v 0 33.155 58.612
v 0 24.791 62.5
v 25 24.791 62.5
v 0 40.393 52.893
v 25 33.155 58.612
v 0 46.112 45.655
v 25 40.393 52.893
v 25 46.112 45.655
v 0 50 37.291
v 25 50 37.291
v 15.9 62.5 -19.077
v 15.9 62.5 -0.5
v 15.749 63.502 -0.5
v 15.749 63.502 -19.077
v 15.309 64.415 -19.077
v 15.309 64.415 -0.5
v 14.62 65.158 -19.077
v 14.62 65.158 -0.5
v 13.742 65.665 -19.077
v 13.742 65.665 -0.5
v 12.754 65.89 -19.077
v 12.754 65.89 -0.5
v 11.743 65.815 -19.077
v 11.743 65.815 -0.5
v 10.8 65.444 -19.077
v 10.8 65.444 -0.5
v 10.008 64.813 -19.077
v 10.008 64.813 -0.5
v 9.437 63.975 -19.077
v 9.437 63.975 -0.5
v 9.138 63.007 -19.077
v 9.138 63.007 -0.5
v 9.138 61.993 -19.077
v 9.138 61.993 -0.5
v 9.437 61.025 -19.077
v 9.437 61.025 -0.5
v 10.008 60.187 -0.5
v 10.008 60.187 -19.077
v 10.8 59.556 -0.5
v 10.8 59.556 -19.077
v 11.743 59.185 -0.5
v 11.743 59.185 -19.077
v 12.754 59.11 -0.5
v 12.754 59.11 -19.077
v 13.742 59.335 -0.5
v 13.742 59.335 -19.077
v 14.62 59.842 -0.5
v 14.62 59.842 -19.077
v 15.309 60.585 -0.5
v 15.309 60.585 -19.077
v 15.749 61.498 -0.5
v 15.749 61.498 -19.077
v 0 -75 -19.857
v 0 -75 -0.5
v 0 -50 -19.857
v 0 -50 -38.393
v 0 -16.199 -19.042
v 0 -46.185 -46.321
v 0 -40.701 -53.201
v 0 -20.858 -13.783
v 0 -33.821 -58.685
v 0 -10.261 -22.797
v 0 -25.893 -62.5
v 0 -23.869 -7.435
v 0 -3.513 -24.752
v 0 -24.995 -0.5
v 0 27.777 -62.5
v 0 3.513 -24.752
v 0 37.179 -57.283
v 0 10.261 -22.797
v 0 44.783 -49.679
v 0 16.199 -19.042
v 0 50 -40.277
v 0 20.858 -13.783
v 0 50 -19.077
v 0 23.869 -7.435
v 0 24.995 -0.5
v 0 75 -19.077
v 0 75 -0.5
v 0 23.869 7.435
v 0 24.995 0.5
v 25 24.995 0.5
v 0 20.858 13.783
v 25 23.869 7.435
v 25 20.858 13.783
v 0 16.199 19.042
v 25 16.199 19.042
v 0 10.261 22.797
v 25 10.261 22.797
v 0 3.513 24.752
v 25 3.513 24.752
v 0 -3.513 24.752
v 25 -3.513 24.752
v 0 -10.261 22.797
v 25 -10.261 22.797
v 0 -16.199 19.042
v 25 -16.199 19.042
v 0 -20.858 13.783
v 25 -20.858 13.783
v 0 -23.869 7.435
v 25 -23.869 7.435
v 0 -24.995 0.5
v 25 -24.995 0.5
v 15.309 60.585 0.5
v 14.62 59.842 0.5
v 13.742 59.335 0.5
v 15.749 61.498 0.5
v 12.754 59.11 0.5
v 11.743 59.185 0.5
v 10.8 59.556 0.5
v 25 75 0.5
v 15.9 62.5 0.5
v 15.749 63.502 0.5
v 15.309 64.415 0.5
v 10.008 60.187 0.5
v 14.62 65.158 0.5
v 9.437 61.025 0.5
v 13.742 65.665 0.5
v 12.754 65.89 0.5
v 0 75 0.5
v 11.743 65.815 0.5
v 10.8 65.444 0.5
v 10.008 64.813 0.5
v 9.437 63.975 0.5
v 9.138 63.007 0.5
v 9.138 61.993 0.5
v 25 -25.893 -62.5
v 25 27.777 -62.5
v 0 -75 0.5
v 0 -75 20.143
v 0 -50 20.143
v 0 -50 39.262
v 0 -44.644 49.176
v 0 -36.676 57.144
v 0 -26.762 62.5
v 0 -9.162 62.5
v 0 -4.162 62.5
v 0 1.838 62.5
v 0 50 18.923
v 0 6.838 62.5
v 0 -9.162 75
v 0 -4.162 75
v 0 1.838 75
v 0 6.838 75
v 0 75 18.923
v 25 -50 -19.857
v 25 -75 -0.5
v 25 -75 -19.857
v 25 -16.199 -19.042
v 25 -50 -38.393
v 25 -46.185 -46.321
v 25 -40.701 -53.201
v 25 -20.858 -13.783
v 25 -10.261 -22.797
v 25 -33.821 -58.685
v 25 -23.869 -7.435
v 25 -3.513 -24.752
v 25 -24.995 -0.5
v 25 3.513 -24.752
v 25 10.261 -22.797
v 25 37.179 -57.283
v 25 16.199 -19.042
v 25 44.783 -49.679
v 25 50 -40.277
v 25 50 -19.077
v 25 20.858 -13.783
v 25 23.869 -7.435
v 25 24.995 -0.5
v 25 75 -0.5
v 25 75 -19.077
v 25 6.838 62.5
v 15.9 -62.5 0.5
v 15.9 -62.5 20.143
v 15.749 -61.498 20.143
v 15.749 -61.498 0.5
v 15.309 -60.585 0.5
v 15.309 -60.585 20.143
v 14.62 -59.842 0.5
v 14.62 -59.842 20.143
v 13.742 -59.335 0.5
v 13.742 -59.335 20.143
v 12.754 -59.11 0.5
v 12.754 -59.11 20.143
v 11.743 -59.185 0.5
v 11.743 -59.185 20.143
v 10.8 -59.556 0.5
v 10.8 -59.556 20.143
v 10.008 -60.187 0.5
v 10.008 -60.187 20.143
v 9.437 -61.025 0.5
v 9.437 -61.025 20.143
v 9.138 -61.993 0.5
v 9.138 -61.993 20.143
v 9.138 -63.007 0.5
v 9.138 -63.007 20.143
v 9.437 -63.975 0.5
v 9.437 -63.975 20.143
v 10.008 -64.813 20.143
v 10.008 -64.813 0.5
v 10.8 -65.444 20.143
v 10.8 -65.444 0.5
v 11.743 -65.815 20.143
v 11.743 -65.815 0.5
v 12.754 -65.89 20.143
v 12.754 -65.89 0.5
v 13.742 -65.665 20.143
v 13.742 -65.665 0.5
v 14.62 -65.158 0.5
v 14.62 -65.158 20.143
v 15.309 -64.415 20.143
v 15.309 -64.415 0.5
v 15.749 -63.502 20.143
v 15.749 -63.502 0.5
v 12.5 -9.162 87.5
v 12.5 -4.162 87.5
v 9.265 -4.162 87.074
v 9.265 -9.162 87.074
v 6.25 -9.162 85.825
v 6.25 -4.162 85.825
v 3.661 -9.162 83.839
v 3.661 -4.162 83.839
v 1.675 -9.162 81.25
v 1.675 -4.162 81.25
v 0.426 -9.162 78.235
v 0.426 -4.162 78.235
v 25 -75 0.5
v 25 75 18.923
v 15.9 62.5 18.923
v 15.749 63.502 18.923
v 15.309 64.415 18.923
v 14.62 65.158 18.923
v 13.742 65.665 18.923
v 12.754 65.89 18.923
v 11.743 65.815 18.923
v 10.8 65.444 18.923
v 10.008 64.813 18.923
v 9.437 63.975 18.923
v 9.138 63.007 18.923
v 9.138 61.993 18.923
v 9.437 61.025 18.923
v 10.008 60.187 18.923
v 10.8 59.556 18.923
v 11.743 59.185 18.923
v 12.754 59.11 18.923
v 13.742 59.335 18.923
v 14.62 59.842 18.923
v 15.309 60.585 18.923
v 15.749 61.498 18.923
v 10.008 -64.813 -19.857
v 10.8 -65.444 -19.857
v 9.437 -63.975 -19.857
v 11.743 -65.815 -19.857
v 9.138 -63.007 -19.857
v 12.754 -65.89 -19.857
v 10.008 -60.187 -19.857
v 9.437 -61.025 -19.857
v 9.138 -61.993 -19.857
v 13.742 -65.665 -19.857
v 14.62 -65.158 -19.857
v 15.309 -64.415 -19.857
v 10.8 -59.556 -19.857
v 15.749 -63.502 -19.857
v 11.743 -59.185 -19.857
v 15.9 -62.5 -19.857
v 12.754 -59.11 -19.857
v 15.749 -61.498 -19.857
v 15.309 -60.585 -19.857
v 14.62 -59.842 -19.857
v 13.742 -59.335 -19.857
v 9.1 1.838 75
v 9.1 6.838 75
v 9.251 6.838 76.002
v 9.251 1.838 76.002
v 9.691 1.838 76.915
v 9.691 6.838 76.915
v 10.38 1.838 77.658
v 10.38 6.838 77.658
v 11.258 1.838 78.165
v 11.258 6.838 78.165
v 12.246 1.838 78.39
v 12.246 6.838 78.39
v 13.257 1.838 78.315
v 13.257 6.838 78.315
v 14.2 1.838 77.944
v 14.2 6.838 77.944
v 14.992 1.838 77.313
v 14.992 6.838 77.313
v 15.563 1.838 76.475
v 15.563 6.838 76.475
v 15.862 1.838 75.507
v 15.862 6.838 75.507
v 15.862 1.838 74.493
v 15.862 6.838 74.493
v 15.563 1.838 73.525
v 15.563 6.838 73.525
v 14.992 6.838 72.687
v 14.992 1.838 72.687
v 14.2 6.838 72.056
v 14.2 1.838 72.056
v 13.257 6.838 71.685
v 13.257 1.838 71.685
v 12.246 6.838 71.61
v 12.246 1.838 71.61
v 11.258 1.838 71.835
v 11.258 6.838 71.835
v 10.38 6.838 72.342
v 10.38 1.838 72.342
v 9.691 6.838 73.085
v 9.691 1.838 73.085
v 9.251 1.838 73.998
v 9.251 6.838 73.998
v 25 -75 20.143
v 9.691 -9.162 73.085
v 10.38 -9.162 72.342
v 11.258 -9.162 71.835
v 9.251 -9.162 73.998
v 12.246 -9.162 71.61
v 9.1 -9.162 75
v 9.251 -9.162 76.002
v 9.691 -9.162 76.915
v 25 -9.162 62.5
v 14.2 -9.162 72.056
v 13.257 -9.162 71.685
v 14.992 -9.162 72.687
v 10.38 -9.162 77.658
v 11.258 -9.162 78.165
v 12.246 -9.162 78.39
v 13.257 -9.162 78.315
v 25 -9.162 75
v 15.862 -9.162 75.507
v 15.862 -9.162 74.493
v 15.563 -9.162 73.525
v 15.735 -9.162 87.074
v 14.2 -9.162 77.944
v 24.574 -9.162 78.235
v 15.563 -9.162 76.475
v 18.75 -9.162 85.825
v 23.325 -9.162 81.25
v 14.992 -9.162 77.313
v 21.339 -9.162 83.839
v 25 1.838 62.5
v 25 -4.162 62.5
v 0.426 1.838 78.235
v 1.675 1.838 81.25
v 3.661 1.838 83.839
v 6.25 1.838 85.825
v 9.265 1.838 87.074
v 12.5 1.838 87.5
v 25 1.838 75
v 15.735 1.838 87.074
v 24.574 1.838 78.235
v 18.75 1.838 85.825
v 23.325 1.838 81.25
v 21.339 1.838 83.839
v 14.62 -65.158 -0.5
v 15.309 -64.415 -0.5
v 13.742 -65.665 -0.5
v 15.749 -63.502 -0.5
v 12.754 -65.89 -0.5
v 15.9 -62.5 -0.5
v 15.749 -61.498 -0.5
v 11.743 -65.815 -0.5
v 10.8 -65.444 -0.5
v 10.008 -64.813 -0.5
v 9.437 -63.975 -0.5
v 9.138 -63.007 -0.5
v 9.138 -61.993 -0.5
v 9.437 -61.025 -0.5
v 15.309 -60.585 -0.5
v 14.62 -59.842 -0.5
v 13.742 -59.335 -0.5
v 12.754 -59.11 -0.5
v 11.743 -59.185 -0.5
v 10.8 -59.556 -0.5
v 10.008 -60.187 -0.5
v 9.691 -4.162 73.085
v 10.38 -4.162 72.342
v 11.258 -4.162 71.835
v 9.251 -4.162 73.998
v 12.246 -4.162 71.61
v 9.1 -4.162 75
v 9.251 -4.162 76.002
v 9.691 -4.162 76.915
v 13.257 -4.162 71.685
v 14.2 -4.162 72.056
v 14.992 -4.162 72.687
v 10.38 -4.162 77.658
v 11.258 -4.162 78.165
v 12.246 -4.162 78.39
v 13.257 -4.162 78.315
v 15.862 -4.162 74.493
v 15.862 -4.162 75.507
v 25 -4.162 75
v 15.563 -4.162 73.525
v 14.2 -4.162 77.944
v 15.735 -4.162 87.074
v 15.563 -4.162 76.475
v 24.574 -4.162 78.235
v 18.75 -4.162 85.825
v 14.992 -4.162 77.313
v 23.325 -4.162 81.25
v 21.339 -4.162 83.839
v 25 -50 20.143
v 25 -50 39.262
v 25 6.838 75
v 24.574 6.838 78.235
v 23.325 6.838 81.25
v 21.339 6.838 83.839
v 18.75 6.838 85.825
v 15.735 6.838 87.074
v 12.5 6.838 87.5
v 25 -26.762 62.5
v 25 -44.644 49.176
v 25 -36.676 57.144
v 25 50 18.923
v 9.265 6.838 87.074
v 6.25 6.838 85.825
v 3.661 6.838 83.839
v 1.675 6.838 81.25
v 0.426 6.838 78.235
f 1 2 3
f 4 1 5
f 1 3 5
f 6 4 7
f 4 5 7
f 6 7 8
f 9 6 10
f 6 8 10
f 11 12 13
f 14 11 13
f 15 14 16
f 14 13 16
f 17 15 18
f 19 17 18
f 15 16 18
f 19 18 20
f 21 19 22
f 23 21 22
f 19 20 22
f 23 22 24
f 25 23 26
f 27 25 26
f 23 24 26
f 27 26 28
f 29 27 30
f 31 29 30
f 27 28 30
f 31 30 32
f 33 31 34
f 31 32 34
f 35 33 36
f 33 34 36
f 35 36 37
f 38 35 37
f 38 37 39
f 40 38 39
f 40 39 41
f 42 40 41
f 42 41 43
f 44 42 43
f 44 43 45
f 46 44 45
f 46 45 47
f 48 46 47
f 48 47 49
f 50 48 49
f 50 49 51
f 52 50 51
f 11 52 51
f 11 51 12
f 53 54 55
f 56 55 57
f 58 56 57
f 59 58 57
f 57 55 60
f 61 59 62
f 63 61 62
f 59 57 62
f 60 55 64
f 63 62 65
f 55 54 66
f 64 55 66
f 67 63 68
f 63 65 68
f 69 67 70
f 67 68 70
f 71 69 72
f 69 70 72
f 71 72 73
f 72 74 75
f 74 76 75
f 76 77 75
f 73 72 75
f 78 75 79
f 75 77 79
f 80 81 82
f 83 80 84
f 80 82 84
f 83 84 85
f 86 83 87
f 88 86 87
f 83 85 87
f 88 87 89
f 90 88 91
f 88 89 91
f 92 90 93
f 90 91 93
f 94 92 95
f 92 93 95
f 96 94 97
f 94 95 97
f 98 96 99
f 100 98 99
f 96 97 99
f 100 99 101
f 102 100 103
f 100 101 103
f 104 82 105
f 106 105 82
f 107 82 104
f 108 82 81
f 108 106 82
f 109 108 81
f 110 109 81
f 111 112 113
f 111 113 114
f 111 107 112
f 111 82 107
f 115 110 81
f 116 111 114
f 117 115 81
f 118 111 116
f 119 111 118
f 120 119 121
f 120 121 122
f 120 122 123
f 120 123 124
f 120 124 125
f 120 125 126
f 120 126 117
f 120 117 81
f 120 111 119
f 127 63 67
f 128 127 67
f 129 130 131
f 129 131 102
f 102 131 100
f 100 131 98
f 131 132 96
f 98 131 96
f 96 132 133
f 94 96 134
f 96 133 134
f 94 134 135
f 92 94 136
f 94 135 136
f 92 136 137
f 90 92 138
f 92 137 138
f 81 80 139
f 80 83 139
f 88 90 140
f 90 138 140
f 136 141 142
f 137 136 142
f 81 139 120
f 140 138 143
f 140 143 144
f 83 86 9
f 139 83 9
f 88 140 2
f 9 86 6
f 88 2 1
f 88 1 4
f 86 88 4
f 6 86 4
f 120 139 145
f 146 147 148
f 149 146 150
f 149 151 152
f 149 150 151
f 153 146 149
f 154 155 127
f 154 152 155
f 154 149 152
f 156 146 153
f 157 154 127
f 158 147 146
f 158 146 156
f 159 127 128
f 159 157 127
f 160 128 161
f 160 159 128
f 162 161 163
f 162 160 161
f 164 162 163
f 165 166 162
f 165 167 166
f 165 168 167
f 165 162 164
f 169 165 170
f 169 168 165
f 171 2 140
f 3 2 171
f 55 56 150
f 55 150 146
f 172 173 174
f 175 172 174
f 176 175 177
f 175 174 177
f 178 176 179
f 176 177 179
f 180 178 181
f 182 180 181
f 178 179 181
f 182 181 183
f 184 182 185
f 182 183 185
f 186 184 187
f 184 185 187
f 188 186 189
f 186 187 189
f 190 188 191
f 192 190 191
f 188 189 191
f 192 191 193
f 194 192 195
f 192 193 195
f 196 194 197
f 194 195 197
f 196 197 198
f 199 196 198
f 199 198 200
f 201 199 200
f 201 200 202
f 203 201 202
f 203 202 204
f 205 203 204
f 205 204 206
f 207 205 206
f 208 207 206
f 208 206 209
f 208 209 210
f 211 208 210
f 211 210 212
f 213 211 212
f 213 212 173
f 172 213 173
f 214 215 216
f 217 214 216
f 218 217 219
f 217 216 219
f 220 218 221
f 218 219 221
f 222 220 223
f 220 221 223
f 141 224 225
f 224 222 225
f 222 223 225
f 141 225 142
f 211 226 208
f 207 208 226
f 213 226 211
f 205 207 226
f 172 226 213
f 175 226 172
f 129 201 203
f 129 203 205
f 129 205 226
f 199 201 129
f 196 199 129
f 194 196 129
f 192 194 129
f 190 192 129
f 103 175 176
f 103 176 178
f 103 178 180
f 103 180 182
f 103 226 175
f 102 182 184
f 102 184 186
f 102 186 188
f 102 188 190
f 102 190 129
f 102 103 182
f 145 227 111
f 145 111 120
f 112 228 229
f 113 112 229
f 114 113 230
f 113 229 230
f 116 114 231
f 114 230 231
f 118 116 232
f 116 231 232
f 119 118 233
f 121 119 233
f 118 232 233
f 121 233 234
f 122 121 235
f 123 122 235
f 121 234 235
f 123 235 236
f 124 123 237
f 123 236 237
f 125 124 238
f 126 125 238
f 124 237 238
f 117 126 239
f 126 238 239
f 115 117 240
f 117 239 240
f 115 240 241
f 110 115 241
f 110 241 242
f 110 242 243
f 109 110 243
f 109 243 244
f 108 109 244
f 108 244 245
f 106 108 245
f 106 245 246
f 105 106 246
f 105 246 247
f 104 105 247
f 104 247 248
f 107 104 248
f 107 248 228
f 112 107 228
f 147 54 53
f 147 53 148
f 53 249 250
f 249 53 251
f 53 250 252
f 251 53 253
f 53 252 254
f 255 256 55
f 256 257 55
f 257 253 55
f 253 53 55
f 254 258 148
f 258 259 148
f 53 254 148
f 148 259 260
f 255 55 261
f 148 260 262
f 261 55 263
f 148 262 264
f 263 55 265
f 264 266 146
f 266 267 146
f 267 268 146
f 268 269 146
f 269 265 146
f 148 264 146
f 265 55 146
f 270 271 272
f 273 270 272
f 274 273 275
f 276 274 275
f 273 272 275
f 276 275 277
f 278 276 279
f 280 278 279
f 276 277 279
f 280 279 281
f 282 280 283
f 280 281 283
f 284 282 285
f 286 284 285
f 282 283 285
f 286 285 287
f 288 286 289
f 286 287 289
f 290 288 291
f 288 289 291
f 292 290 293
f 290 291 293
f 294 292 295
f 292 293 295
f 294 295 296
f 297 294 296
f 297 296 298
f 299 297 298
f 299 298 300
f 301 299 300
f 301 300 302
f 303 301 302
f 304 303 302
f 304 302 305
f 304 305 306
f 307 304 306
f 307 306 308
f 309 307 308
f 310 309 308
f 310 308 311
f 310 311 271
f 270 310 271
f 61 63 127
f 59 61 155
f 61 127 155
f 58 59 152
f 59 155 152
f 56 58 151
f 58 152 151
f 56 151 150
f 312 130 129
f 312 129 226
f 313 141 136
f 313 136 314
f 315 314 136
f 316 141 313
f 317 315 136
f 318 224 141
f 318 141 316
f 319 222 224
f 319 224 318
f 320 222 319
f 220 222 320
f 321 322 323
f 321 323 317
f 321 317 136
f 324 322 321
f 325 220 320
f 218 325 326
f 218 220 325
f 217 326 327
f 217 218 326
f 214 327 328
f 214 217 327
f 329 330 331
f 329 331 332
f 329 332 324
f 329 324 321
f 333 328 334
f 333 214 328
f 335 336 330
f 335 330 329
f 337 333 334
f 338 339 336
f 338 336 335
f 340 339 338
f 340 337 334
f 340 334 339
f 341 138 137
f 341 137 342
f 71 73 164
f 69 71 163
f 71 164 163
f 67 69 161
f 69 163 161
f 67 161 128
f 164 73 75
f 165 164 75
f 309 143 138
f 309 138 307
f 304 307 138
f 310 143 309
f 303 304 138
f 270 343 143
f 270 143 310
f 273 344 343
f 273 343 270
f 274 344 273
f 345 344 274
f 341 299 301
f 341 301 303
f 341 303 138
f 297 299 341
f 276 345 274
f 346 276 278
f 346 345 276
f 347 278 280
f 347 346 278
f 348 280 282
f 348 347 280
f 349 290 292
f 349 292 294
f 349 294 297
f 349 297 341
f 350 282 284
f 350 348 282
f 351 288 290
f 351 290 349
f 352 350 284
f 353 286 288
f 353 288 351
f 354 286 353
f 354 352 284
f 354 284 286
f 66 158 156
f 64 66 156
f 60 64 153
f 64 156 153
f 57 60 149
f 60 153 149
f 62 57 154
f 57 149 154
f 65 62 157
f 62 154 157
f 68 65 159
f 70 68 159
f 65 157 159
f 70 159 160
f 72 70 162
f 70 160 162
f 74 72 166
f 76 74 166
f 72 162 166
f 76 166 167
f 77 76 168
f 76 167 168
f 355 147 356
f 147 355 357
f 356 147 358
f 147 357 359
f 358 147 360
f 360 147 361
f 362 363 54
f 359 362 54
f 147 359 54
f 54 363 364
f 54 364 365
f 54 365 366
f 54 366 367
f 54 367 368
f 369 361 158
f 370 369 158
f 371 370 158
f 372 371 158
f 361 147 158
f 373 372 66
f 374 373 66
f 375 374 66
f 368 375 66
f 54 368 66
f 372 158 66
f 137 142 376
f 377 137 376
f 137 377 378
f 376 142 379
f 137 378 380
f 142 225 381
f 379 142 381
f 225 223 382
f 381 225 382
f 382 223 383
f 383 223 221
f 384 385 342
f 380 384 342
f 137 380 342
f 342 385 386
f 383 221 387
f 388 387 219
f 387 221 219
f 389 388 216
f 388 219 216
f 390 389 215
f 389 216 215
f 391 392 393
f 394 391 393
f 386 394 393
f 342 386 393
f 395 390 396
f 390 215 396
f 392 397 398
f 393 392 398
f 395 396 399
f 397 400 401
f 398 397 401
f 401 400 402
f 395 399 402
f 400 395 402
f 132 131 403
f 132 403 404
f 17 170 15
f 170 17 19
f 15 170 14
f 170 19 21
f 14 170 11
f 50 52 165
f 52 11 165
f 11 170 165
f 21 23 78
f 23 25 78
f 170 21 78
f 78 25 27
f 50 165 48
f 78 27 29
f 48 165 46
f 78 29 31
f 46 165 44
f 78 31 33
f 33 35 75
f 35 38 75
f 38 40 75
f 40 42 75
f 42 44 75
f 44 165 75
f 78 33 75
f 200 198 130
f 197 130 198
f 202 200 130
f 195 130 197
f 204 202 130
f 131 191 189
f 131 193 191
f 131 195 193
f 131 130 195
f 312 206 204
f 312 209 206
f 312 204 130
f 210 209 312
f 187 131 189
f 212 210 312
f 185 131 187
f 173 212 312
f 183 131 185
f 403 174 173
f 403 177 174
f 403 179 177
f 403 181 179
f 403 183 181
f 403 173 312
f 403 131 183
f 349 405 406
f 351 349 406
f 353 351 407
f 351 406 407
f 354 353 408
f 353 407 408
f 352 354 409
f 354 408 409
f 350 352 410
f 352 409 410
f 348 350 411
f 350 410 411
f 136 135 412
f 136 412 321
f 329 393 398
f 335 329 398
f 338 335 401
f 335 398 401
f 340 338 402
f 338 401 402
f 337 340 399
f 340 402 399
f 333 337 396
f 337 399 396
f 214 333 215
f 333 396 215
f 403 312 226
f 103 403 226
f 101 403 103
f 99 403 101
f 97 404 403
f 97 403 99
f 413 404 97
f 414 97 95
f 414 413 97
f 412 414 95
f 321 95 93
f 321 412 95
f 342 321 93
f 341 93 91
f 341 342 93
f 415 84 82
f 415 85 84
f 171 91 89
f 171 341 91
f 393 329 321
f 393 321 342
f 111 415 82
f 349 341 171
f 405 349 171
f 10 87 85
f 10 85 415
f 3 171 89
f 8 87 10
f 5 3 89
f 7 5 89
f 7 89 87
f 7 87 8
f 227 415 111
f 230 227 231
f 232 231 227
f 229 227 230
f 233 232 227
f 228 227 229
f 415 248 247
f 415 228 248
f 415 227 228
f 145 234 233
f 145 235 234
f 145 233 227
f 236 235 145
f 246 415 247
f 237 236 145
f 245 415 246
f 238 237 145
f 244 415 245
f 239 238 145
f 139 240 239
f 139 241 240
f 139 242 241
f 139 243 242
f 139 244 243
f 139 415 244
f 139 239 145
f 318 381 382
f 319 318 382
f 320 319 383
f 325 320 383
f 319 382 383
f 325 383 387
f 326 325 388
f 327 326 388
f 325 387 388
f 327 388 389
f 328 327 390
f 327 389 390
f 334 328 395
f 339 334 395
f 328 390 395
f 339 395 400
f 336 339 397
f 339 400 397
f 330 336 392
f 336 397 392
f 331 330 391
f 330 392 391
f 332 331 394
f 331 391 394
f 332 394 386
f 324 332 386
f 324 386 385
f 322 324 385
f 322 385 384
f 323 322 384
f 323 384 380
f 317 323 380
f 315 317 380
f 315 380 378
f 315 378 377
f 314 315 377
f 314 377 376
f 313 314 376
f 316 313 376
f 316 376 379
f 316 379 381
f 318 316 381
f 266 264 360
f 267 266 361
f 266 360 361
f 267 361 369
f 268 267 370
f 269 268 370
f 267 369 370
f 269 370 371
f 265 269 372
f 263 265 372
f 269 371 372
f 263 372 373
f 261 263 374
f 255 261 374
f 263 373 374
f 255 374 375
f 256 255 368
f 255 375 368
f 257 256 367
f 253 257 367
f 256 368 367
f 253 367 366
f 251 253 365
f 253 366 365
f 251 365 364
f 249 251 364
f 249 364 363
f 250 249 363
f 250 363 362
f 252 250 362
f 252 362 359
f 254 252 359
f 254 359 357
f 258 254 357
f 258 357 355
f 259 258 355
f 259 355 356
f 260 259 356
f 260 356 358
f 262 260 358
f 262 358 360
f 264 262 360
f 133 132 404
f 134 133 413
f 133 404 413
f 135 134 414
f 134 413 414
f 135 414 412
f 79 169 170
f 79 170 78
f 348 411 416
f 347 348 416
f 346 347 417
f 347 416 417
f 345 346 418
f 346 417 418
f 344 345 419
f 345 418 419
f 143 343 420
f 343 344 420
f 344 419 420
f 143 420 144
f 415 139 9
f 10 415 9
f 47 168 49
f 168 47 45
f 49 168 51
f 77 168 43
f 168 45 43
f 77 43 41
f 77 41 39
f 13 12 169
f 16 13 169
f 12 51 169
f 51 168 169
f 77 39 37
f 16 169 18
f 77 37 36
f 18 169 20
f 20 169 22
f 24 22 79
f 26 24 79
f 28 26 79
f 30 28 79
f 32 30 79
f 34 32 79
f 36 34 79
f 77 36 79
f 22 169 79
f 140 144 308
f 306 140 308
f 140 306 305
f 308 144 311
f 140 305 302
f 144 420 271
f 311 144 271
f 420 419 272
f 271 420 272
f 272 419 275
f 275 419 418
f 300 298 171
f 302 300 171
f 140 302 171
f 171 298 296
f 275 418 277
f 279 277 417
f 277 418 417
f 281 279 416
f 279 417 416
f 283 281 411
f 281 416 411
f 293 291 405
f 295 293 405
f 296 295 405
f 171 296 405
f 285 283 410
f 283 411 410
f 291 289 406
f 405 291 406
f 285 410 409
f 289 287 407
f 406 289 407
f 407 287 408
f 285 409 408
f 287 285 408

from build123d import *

# Parameters (mm, degrees)
F0_W      = 100
F0_H      = 125
F1_DEPTH  = 25
F2_R      = 25
F3_DEPTH  = 25.001
F5_DEPTH  = 25.001
F6_W      = 25
F6_H      = 40
F7_DEPTH  = 25
F8_W      = 25
F8_H      = 38
F9_DEPTH  = 25
F10_W     = 25
F10_H     = 1
F11_DEPTH = 150.001
F12_R     = 3.4
F13_DEPTH = 60
F14_R     = 3.4
F15_DEPTH = 82.6435668558
F16_R     = 3.4
F17_DEPTH = 82.3584331442
F18_R     = 3.4
F19_DEPTH = 81.5777915887
F20_W     = 25
F20_H     = 30
F21_DEPTH = 25
F24_DEPTH = 88.8387229258
F22_W     = 25
F22_H     = 7
F22_H_2   = 6
F25_DEPTH = 25
F26_R     = 3.4
F27_DEPTH = 81.8387229258


with BuildPart() as f1:
    # F0 (on Right) → F1 (new body)
    with BuildSketch(Plane.YZ):
        Rectangle(F0_W, F0_H)
    extrude(amount=F1_DEPTH)

    # F2 (on face) → F3 (cut, through all)
    with BuildSketch(Plane.YZ.offset(25)):
        Circle(F2_R)
    extrude(amount=-F3_DEPTH, mode=Mode.SUBTRACT)

    # F4 (on face) → F5 (cut, through all)
    with BuildSketch(Plane.YZ.offset(25)):
        with BuildLine():
            ThreePointArc((-50, 39.2622770742), (-40.9491987099, 53.4491987099), (-26.7622770742, 62.5))
            Line((-26.7622770742, 62.5), (-50, 62.5))
            Line((-50, 62.5), (-50, 39.2622770742))
        make_face()
        with BuildLine():
            Line((50, 62.5), (24.7910425067, 62.5))
            ThreePointArc((24.7910425067, 62.5), (40.3932512412, 52.8932512412), (50, 37.2910425067))
            Line((50, 37.2910425067), (50, 62.5))
        make_face()
        with BuildLine():
            Line((50, -62.5), (50, -40.2766680345))
            ThreePointArc((50, -40.2766680345), (41.246497715, -53.746497715), (27.7766680345, -62.5))
            Line((27.7766680345, -62.5), (50, -62.5))
        make_face()
        with BuildLine():
            ThreePointArc((-25.8934732527, -62.5), (-40.7006761297, -53.2006761297), (-50, -38.3934732527))
            Line((-50, -38.3934732527), (-50, -62.5))
            Line((-50, -62.5), (-25.8934732527, -62.5))
        make_face()
    extrude(amount=-F5_DEPTH, mode=Mode.SUBTRACT)

    # F6 (on face) → F7 (join)
    with BuildSketch(Plane.XZ.offset(50)):
        with Locations((12.5, 0.1425668558)):
            Rectangle(F6_W, F6_H)
    extrude(amount=F7_DEPTH)

    # F8 (on face) → F9 (join)
    with BuildSketch(Plane(origin=(0, 50, 0), x_dir=(-1, 0, 0), z_dir=(0, 1, 0))):
        with Locations((-12.5, -0.0767915887)):
            Rectangle(F8_W, F8_H)
    extrude(amount=F9_DEPTH)

    # F10 (on face) → F11 (cut, through all)
    with BuildSketch(Plane(origin=(0, 75, 0), x_dir=(-1, 0, 0), z_dir=(0, 1, 0))):
        with Locations((-12.5, 0)):
            Rectangle(F10_W, F10_H)
    extrude(amount=-F11_DEPTH, mode=Mode.SUBTRACT)

    # F12 (on face) → F13 (cut)
    with BuildSketch(Plane.XY.offset(18.9232084113)):
        with Locations((12.5, 62.5)):
            Circle(F12_R)
    extrude(amount=-F13_DEPTH, mode=Mode.SUBTRACT)

    # F14 (on face) → F15 (cut, through all)
    with BuildSketch(Plane.XY.offset(20.1425668558)):
        with Locations((12.5, -62.5)):
            Circle(F14_R)
    extrude(amount=-F15_DEPTH, mode=Mode.SUBTRACT)

    # F16 (on face) → F17 (cut, through all)
    with BuildSketch(Plane(origin=(0, 0, -19.8574331442), x_dir=(1, 0, 0), z_dir=(0, 0, -1))):
        with Locations((12.5, 62.5)):
            Circle(F16_R)
    extrude(amount=-F17_DEPTH, mode=Mode.SUBTRACT)

    # F18 (on face) → F19 (cut, through all)
    with BuildSketch(Plane(origin=(0, 0, -19.0767915887), x_dir=(1, 0, 0), z_dir=(0, 0, -1))):
        with Locations((12.5, -62.5)):
            Circle(F18_R)
    extrude(amount=-F19_DEPTH, mode=Mode.SUBTRACT)

    # F20 (on face) → F21 (join)
    with BuildSketch(Plane.XY.offset(62.5)):
        with Locations((12.5, -1.1622770742)):
            Rectangle(F20_W, F20_H)
    extrude(amount=F21_DEPTH)

    # F23 (on face) → F24 (cut, through all)
    with BuildSketch(Plane(origin=(0, 13.8377229258, 0), x_dir=(-1, 0, 0), z_dir=(0, 1, 0))):
        with BuildLine():
            ThreePointArc((-12.5, 87.5), (-3.6611652352, 83.8388347648), (0, 75))
            Line((0, 75), (0, 87.5))
            Line((0, 87.5), (-12.5, 87.5))
        make_face()
        with BuildLine():
            ThreePointArc((-25, 75), (-21.3388347648, 83.8388347648), (-12.5, 87.5))
            Line((-12.5, 87.5), (-25, 87.5))
            Line((-25, 87.5), (-25, 75))
        make_face()
    extrude(amount=-F24_DEPTH, mode=Mode.SUBTRACT)

    # F22 (on face) → F25 (cut)
    with BuildSketch(Plane.XY.offset(87.5)):
        with Locations((12.5, -12.6622770742)):
            Rectangle(F22_W, F22_H)
        with Locations((12.5, -1.1622770742)):
            Rectangle(F22_W, F22_H_2)
        with Locations((12.5, 10.3377229258)):
            Rectangle(F22_W, F22_H)
    extrude(amount=-F25_DEPTH, mode=Mode.SUBTRACT)

    # F26 (on face) → F27 (cut, through all)
    with BuildSketch(Plane(origin=(0, 6.8377229258, 0), x_dir=(-1, 0, 0), z_dir=(0, 1, 0))):
        with Locations((-12.5, 75)):
            Circle(F26_R)
    extrude(amount=-F27_DEPTH, mode=Mode.SUBTRACT)


solid = f1.part
